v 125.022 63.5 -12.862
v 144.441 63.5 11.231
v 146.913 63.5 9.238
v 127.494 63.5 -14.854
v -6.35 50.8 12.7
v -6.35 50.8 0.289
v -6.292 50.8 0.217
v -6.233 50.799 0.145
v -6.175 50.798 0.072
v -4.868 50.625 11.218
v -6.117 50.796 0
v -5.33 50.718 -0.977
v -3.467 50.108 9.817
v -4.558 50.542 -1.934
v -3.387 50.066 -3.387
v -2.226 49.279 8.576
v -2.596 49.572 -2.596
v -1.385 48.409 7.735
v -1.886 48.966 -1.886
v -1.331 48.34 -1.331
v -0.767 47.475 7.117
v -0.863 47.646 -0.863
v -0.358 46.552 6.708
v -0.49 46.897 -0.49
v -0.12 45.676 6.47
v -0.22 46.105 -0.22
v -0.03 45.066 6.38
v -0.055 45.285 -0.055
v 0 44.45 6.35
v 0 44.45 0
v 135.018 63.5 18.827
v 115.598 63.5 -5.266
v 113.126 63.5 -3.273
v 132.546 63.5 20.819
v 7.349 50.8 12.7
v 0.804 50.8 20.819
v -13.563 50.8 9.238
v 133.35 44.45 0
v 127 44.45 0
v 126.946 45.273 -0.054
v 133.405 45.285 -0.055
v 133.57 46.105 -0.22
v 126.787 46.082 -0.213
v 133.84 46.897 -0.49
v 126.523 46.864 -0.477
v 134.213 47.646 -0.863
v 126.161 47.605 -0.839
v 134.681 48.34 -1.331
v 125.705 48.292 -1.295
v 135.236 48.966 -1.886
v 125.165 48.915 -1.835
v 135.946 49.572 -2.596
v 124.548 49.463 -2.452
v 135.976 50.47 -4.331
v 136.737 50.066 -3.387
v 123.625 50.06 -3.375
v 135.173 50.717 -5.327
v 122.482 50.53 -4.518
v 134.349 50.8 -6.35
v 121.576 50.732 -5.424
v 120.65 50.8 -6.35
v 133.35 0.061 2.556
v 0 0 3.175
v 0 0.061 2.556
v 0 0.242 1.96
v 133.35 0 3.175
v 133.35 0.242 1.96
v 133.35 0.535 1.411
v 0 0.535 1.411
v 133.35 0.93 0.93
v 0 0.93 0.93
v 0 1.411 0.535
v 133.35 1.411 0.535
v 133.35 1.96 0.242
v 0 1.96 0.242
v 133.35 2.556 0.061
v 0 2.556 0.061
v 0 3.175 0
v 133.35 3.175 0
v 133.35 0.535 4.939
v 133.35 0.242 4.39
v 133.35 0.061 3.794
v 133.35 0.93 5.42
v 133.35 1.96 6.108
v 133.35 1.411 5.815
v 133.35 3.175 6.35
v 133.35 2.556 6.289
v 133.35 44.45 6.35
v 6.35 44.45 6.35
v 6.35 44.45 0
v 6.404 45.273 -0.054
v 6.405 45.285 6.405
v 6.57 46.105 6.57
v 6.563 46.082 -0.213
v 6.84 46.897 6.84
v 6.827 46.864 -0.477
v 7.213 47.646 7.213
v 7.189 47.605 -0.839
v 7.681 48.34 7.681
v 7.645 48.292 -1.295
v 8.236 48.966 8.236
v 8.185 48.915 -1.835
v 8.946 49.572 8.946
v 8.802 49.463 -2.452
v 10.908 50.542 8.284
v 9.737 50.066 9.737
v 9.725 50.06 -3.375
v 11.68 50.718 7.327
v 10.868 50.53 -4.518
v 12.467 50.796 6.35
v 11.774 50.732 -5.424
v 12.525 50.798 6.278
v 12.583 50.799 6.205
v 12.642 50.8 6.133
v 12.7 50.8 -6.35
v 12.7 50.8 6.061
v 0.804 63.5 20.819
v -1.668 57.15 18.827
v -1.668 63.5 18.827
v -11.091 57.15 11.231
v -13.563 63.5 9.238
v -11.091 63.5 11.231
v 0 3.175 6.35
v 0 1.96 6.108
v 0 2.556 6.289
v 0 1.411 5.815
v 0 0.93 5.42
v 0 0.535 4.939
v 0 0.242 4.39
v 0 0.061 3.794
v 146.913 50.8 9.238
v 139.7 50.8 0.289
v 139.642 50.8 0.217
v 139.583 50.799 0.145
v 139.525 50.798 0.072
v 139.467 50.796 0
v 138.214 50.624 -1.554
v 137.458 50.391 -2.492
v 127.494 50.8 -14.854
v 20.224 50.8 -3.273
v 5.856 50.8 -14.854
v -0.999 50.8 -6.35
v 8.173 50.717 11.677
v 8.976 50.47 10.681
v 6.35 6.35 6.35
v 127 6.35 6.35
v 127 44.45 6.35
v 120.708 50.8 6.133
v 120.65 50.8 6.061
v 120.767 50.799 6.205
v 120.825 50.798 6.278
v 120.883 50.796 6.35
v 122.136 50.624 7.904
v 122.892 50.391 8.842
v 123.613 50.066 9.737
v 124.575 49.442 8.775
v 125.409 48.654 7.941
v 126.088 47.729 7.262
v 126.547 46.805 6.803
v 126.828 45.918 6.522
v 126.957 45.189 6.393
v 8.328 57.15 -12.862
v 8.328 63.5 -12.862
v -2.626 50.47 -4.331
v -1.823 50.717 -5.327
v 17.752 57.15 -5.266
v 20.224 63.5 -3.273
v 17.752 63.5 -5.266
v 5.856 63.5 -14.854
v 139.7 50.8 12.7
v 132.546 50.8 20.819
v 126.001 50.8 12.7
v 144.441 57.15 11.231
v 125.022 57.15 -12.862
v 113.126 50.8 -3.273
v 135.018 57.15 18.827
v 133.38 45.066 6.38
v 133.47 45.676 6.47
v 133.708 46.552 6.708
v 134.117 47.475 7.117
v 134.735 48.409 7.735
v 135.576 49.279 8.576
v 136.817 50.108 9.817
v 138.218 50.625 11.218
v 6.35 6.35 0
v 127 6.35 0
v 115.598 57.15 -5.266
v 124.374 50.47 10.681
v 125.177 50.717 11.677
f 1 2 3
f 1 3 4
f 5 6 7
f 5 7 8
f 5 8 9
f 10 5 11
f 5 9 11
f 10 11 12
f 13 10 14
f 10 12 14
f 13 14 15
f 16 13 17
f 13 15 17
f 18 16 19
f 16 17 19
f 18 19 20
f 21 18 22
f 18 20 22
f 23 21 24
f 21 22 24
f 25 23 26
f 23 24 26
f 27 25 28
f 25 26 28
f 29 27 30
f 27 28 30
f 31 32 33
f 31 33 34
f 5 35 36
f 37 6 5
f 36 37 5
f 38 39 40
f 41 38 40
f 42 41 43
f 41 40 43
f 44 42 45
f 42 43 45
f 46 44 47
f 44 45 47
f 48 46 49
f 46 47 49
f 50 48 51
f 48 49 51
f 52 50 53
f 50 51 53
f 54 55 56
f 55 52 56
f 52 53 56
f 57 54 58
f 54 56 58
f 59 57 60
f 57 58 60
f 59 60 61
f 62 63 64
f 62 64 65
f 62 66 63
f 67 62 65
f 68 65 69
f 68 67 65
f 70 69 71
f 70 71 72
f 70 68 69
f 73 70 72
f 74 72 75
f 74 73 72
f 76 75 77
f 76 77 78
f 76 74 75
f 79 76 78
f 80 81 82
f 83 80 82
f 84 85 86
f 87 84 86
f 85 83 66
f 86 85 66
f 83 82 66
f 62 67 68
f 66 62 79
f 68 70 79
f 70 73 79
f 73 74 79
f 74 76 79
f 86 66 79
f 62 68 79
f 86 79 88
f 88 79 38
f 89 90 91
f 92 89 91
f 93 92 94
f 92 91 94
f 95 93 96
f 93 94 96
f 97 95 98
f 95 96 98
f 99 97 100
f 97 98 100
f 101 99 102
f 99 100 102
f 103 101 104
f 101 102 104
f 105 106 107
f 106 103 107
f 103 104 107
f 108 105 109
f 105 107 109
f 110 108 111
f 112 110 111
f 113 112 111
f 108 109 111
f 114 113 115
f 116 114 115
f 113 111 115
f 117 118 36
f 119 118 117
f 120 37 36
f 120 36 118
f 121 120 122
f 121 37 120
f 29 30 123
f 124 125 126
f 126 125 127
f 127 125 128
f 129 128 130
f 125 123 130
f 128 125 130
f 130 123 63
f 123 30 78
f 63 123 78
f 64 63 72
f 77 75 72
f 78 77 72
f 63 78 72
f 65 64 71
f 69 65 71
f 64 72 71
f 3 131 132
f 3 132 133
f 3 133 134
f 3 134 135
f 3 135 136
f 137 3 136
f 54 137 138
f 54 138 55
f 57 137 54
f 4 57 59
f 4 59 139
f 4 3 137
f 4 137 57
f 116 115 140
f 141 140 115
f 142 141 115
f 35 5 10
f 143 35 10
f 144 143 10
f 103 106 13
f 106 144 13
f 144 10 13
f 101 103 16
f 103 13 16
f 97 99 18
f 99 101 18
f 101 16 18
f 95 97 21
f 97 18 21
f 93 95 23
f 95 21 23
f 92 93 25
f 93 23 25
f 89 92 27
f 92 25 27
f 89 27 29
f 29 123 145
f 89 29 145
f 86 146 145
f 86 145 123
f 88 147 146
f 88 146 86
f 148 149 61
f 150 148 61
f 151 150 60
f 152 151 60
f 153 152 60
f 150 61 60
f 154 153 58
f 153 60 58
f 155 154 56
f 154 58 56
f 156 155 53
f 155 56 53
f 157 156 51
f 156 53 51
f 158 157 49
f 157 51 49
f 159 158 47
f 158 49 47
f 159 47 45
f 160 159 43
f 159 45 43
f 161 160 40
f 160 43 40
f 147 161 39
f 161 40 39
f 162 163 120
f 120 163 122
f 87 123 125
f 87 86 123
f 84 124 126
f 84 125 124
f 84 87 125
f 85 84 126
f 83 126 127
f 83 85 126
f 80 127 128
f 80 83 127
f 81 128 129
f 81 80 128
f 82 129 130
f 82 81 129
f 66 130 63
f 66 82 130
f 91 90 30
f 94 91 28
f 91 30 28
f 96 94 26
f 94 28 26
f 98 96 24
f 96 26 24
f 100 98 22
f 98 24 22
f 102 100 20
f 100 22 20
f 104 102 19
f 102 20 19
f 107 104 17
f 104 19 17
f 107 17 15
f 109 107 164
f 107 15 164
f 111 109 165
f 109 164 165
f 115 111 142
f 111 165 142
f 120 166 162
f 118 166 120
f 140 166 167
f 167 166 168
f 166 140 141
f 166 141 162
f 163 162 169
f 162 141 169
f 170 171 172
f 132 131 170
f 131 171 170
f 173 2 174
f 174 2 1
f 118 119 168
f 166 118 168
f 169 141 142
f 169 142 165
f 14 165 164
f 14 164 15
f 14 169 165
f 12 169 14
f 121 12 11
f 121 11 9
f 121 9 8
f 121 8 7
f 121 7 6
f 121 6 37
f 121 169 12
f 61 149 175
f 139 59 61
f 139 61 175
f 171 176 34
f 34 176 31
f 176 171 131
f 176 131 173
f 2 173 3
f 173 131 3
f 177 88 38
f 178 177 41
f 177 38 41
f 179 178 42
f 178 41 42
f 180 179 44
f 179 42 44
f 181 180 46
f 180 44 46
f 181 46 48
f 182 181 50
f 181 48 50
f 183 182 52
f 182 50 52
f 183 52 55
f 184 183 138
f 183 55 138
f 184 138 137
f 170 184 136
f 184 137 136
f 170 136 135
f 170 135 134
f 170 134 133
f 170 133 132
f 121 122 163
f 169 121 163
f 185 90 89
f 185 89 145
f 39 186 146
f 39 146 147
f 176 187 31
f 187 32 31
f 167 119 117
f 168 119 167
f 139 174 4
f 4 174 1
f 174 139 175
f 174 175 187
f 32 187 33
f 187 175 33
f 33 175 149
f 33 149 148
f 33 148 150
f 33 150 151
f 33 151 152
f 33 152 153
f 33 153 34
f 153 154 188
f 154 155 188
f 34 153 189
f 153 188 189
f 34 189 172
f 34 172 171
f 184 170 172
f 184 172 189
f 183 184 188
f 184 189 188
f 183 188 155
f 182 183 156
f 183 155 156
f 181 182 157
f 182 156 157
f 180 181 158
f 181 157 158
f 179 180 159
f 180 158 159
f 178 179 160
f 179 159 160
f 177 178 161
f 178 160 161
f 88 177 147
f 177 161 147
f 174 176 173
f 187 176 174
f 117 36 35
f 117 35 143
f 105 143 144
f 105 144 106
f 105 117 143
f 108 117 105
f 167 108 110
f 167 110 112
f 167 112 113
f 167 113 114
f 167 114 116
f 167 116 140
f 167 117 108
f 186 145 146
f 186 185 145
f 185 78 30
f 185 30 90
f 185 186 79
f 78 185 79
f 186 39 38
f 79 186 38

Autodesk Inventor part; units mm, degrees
ref_plane "YZ Plane" through (0, 0, 0) normal (1, 0, 0) x (0, 1, 0)
ref_plane "XZ Plane" through (0, 0, 0) normal (0, 1, 0) x (-1, 0, 0)
ref_plane "XY Plane" through (0, 0, 0) normal (0, 0, 1) x (1, 0, 0)
sketch "Sketch1" plane through (0, 0, 0) normal (0, 0, 1) x (1, 0, 0)
  line L0 (0, 0) -> (133.35, 0)
  line L1 (133.35, 0) -> (133.35, 50.8)
  line L2 (0, 50.8) -> (0, 0)
  line L3 (0, 50.8) -> (6.35, 50.8)
  line L4 (6.35, 50.8) -> (6.35, 6.35)
  line L5 (6.35, 6.35) -> (127, 6.35)
  line L6 (127, 6.35) -> (127, 50.8)
  line L7 (127, 50.8) -> (133.35, 50.8)
  dimension "d1" = 50.8
  dimension "d2" = 6.35
  dimension "d3" = 44.45
  dimension "d4" = 120.65
  dimension "d5" = 133.35
extrude "Extrusion1" add sketch "Sketch1" along normal blind 6.35
fillet "Fillet1" radius 3.175 2 edges at (66.675, 0, 6.35) (66.675, 0, 0)
sketch "Sketch2" plane through (0, 50.8, 0) normal (0, 1, 0) x (1, 0, 0)
  line L0 (6.35, -6.35) -> (16.515747, 6.26204)
  line L1 (-2.903527, -17.830303) -> (6.35, -6.35)
  line L2 (16.515747, 6.26204) -> (9.563953, 11.86543)
  line L3 (9.563953, 11.86543) -> (-9.855321, -12.226913)
  line L4 (-9.855321, -12.226913) -> (-2.903527, -17.830303)
  line L5 (127, 0) -> (127, -6.35)
  line L6 (127, -6.35) -> (143.198942, -6.35) construction
  line L7 (116.834265, 6.26204) -> (123.786067, 11.86543)
  line L8 (123.786067, 11.86543) -> (143.205318, -12.226913)
  line L9 (143.205318, -12.226913) -> (136.253516, -17.830303)
  line L10 (133.35, -6.35) -> (127, -6.35)
  line L11 (116.834265, 6.26204) -> (136.253516, -17.830303)
  point P0 (0, 0)
extrude "Extrusion2" add sketch "Sketch2" along normal blind 6.35
sketch "Sketch4" plane through (16.515747, 50.8, -6.26204) normal (0.7785715, 0, 0.6275559) x (0.6275559, 0, -0.7785715)
  point P0 (-15.240001, -50.8)
sketch "Sketch5" plane through (16.515747, 50.8, -6.26204) normal (0.7785715, 0, 0.6275559) x (0.6275559, 0, -0.7785715)
  point P0 (-15.240001, -50.8)
sketch "Sketch6" plane through (16.515747, 50.8, -6.26204) normal (0.7785715, 0, 0.6275559) x (0.6275559, 0, -0.7785715)
  line L0 (-30.944292, 6.35) -> (0, 6.35)
  line L1 (-30.944292, 0) -> (-30.944292, 6.35)
  line L2 (-30.944292, 6.35) -> (-30.944292, 0)
  line L3 (0, 0) -> (0, 6.35)
  line L4 (-30.944292, 0) -> (0, 0)
  line L5 (0, 0) -> (0, 6.35)
  line L6 (0, 6.35) -> (-30.944292, 6.35)
  point P0 (-15.240001, -50.8)
extrude "Extrusion3" add sketch "Sketch6" along normal blind 1.5875
sketch "Sketch7" plane through (-9.855321, 50.8, 12.226913) normal (-0.7785715, 0, -0.6275559) x (-0.6275559, 0, 0.7785715)
  line L0 (-30.944292, 6.35) -> (0, 6.35)
  line L1 (0, 0) -> (-30.944292, 0)
  line L2 (-30.944292, 6.35) -> (-30.944292, 0)
  line L3 (-30.944292, 0) -> (0, 0)
  line L4 (0, 6.35) -> (0, 0)
  line L5 (0, 0) -> (0, 6.35)
  line L6 (0, 6.35) -> (-30.944292, 6.35)
  point P0 (-15.704291, -50.8)
extrude "Extrusion4" add sketch "Sketch7" along normal blind 1.5875
sketch "Sketch8" plane through (136.253516, 50.8, 17.830303) normal (-0.7785718, 0, 0.6275555) x (0.6275555, 0, 0.7785718)
  line L0 (-30.944277, 6.35) -> (0, 6.35)
  line L1 (0, 0) -> (0, 6.35)
  line L2 (-30.944277, 6.35) -> (0, 6.35)
  line L3 (0, 6.35) -> (0, 0)
  line L4 (0, 0) -> (-30.944277, 0)
  line L5 (-30.944277, 0) -> (-30.944277, 6.35)
  line L6 (-30.944277, 0) -> (-30.944277, 6.35)
  point P0 (-99.388813, -50.8)
extrude "Extrusion5" add sketch "Sketch8" along normal blind 1.5875
sketch "Sketch9" plane through (123.786067, 50.8, -11.86543) normal (0.7785718, 0, -0.6275555) x (-0.6275555, 0, -0.7785718)
  line L0 (-30.944277, 6.35) -> (0, 6.35)
  line L1 (-30.944277, 6.35) -> (0, 6.35)
  line L2 (0, 0) -> (-30.944277, 0)
  line L3 (0, 6.35) -> (0, 0)
  line L4 (0, 0) -> (-30.944277, 0)
  line L5 (-30.944277, 0) -> (-30.944277, 6.35)
  point P0 (68.444536, -50.8)
extrude "Extrusion6" add sketch "Sketch9" along normal blind 1.5875
sketch "Sketch10" plane through (125.02205, 50.8, -12.861674) normal (0.7785718, 0, -0.6275555) x (-0.6275555, 0, -0.7785718)
  point P0 (68.444536, -50.8)
sketch "Sketch11" plane through (125.02205, 50.8, -12.861674) normal (0.7785718, 0, -0.6275555) x (-0.6275555, 0, -0.7785718)
  line L0 (0, 0) -> (0, 6.35)
  line L1 (0, 0) -> (0, 12.7)
  line L2 (-30.944277, 6.35) -> (-30.944277, 0)
  line L3 (0, 0) -> (-30.944277, 0)
  line L4 (-30.944277, 0) -> (-30.944277, 12.7)
  line L5 (-30.944277, 12.7) -> (0, 12.7)
  point P0 (68.444536, -50.8)
  point P1 (0, 6.35)
  point P2 (-30.944277, 6.35)
  dimension "d40" = 12.7
extrude "Extrusion7" add sketch "Sketch11" along normal blind 3.175
sketch "Sketch12" plane through (135.017533, 50.8, 18.826547) normal (-0.7785718, 0, 0.6275555) x (0.6275555, 0, 0.7785718)
  line L0 (0, 12.7) -> (0, 0)
  line L1 (0, 0) -> (0, 12.7)
  line L2 (-30.944277, 12.7) -> (0, 12.7)
  line L3 (0, 12.7) -> (-30.944277, 12.7)
  line L4 (0, 0) -> (-30.944277, 0)
  line L5 (-30.944277, 12.7) -> (-30.944277, 0)
  line L6 (-30.944277, 0) -> (0, 0)
  point P0 (-99.388813, -50.8)
extrude "Extrusion8" add sketch "Sketch12" along normal blind 3.175
sketch "Sketch13" plane through (-11.091303, 50.8, 11.230668) normal (-0.7785715, 0, -0.6275559) x (-0.6275559, 0, 0.7785715)
  line L0 (-30.944292, 0) -> (-30.944292, 6.35)
  line L1 (-30.944292, 0) -> (-30.944292, 12.7)
  line L2 (0, 6.35) -> (0, 0)
  line L3 (-30.944292, 0) -> (0, 0)
  line L4 (0, 0) -> (0, 12.7)
  line L5 (0, 12.7) -> (-30.944292, 12.7)
  point P0 (-15.704291, -50.8)
  point P1 (-30.944292, 6.35)
  dimension "d45" = 12.7
extrude "Extrusion9" add sketch "Sketch13" along normal blind 3.175
sketch "Sketch14" plane through (17.751729, 50.8, -5.265795) normal (0.7785715, 0, 0.6275559) x (0.6275559, 0, -0.7785715)
  line L0 (-30.944292, 0) -> (-30.944292, 6.35)
  line L1 (-30.944292, 0) -> (-30.944292, 12.7)
  line L2 (-30.944292, 12.7) -> (0, 12.7)
  line L3 (-30.944292, 12.7) -> (0, 12.7)
  line L4 (0, 0) -> (0, 6.35)
  line L5 (0, 12.7) -> (0, 0)
  line L6 (0, 0) -> (-30.944292, 0)
  point P0 (-15.240001, -50.8)
  point P1 (0, 6.35)
  point P2 (-30.944292, 12.7)
  point P3 (-30.944292, 6.35)
  dimension "d8" = 3.175
extrude "Extrusion10" add sketch "Sketch14" along normal blind 3.175
fillet "Fillet4" radius 6.35 8 edges at (133.35, 50.8, 3.175) (130.175, 50.8, 0) (127, 50.8, 3.175) (130.175, 50.8, 6.35) (6.35, 50.8, 3.175) (3.175, 50.8, 6.35) (0, 50.8, 3.175) (3.175, 50.8, 0)
properties part number "landing_3DPrint"
